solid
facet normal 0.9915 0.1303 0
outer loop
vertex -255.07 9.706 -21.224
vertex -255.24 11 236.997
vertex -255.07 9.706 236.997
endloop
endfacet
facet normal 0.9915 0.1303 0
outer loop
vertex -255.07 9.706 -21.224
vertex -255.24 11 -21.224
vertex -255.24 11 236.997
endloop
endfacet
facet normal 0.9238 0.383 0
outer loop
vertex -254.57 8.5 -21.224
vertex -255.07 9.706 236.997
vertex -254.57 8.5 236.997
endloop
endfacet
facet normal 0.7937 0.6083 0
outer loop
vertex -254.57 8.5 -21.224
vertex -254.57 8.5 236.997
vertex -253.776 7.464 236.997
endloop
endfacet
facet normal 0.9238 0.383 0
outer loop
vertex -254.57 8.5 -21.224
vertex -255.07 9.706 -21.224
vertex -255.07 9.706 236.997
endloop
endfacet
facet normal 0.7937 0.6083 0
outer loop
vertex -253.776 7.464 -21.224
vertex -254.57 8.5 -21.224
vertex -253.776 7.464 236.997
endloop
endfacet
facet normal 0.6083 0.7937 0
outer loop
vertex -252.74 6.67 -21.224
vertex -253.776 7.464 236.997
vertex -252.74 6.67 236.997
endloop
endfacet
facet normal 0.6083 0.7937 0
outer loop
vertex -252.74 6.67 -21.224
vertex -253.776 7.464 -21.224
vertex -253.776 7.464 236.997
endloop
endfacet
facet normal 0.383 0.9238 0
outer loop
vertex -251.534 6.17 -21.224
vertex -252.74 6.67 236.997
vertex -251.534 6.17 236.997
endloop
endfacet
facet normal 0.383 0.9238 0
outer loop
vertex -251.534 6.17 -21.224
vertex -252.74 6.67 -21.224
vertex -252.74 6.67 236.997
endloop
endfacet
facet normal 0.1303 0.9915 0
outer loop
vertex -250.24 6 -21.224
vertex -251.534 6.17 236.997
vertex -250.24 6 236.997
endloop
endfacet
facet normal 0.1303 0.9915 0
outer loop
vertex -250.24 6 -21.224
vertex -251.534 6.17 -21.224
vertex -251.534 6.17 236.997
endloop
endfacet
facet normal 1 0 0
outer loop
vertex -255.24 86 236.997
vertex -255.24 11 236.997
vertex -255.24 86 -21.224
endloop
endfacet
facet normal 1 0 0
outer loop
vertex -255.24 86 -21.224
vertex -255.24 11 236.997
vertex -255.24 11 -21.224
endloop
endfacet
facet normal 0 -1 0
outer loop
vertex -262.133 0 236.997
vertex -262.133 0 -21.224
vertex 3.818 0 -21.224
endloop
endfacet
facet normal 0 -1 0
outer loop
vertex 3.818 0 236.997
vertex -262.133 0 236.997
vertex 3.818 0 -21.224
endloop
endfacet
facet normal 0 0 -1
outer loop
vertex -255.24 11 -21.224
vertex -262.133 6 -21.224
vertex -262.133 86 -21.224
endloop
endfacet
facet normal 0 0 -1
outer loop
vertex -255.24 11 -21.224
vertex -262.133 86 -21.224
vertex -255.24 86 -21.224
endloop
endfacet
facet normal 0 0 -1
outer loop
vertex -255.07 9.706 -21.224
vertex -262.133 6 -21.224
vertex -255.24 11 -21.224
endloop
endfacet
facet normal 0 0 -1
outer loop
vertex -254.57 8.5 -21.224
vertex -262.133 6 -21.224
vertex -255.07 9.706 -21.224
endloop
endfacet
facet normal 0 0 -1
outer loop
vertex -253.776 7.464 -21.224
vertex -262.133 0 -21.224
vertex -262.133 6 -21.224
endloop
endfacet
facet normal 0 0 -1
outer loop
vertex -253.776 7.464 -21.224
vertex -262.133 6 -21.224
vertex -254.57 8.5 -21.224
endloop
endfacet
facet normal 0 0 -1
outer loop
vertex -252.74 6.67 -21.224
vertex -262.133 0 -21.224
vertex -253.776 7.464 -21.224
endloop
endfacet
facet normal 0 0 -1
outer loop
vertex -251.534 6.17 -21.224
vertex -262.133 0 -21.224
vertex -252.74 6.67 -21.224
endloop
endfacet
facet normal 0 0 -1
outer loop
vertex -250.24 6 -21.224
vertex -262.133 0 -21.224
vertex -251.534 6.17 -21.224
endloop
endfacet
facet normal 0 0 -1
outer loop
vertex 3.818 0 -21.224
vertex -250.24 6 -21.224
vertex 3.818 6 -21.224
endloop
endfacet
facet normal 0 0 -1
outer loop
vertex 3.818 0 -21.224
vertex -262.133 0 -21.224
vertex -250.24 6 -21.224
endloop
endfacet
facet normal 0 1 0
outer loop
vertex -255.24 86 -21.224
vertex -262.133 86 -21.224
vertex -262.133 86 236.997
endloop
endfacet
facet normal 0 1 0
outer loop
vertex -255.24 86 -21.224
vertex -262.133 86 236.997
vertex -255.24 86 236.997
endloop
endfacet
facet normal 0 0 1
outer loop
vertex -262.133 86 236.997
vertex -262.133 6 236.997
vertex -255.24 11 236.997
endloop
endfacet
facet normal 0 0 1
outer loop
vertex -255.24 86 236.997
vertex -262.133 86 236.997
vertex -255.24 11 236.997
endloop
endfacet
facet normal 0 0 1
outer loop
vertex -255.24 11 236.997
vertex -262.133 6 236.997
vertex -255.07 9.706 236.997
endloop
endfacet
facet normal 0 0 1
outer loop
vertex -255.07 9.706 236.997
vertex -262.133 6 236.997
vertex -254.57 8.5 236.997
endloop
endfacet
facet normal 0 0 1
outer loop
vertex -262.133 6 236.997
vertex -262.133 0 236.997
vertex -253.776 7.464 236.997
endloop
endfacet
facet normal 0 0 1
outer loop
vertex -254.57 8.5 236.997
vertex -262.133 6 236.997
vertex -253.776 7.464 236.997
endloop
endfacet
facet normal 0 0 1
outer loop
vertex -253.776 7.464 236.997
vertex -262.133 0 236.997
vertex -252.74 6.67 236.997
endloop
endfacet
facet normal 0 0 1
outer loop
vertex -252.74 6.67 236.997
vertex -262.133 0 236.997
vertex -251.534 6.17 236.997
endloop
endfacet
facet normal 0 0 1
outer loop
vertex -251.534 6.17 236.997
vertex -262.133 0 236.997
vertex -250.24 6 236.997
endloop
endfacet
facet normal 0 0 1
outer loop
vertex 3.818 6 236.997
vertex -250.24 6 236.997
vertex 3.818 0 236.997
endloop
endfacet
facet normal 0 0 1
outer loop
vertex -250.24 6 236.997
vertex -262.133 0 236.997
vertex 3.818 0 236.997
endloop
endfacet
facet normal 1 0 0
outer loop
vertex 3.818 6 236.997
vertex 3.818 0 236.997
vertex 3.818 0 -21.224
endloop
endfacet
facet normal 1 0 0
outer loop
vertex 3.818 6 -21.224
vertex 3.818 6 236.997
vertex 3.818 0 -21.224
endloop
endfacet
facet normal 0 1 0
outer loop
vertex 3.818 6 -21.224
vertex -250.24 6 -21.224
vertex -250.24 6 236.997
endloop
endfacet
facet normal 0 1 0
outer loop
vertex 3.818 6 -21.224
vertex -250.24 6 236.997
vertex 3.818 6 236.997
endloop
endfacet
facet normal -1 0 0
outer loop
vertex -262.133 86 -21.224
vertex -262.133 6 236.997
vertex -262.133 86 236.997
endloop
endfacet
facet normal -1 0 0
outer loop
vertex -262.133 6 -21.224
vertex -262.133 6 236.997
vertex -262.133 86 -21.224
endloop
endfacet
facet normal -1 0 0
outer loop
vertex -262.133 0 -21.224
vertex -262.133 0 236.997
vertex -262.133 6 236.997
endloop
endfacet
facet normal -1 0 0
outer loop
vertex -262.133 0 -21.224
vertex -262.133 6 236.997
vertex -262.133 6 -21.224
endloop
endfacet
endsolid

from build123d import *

# Parameters (mm, degrees)
SKETCH1_W           = 265.950423439
SKETCH1_H           = 258.221174697
BASE_DEPTH          = 6
SKETCH2_W           = 6.892214754
SKETCH2_H           = 258.221174697
BOSS_EXTRUDE2_DEPTH = 80
FILLET1_R           = 5


with BuildPart() as part:
    # Sketch1 → Base (new body)
    with BuildSketch(Plane(origin=(0, 0, 0), x_dir=(1, 0, 0), z_dir=(0, 1, 0))):
        with Locations((-129.157291203, -107.886320424)):
            Rectangle(SKETCH1_W, SKETCH1_H)
    extrude(amount=BASE_DEPTH)

    # Sketch2 → Boss-Extrude2 (add)
    with BuildSketch(Plane(origin=(0, 6, 0), x_dir=(1, 0, 0), z_dir=(0, 1, 0))):
        with Locations((-258.686395546, -107.886320424)):
            Rectangle(SKETCH2_W, SKETCH2_H)
    extrude(amount=BOSS_EXTRUDE2_DEPTH)

    # Fillet1
    fillet1_edges = [part.edges().sort_by_distance(p)[0] for p in [
        (-255.240288169, 6, 107.886320423),
    ]]
    fillet(fillet1_edges, radius=FILLET1_R)


solid = part.part
